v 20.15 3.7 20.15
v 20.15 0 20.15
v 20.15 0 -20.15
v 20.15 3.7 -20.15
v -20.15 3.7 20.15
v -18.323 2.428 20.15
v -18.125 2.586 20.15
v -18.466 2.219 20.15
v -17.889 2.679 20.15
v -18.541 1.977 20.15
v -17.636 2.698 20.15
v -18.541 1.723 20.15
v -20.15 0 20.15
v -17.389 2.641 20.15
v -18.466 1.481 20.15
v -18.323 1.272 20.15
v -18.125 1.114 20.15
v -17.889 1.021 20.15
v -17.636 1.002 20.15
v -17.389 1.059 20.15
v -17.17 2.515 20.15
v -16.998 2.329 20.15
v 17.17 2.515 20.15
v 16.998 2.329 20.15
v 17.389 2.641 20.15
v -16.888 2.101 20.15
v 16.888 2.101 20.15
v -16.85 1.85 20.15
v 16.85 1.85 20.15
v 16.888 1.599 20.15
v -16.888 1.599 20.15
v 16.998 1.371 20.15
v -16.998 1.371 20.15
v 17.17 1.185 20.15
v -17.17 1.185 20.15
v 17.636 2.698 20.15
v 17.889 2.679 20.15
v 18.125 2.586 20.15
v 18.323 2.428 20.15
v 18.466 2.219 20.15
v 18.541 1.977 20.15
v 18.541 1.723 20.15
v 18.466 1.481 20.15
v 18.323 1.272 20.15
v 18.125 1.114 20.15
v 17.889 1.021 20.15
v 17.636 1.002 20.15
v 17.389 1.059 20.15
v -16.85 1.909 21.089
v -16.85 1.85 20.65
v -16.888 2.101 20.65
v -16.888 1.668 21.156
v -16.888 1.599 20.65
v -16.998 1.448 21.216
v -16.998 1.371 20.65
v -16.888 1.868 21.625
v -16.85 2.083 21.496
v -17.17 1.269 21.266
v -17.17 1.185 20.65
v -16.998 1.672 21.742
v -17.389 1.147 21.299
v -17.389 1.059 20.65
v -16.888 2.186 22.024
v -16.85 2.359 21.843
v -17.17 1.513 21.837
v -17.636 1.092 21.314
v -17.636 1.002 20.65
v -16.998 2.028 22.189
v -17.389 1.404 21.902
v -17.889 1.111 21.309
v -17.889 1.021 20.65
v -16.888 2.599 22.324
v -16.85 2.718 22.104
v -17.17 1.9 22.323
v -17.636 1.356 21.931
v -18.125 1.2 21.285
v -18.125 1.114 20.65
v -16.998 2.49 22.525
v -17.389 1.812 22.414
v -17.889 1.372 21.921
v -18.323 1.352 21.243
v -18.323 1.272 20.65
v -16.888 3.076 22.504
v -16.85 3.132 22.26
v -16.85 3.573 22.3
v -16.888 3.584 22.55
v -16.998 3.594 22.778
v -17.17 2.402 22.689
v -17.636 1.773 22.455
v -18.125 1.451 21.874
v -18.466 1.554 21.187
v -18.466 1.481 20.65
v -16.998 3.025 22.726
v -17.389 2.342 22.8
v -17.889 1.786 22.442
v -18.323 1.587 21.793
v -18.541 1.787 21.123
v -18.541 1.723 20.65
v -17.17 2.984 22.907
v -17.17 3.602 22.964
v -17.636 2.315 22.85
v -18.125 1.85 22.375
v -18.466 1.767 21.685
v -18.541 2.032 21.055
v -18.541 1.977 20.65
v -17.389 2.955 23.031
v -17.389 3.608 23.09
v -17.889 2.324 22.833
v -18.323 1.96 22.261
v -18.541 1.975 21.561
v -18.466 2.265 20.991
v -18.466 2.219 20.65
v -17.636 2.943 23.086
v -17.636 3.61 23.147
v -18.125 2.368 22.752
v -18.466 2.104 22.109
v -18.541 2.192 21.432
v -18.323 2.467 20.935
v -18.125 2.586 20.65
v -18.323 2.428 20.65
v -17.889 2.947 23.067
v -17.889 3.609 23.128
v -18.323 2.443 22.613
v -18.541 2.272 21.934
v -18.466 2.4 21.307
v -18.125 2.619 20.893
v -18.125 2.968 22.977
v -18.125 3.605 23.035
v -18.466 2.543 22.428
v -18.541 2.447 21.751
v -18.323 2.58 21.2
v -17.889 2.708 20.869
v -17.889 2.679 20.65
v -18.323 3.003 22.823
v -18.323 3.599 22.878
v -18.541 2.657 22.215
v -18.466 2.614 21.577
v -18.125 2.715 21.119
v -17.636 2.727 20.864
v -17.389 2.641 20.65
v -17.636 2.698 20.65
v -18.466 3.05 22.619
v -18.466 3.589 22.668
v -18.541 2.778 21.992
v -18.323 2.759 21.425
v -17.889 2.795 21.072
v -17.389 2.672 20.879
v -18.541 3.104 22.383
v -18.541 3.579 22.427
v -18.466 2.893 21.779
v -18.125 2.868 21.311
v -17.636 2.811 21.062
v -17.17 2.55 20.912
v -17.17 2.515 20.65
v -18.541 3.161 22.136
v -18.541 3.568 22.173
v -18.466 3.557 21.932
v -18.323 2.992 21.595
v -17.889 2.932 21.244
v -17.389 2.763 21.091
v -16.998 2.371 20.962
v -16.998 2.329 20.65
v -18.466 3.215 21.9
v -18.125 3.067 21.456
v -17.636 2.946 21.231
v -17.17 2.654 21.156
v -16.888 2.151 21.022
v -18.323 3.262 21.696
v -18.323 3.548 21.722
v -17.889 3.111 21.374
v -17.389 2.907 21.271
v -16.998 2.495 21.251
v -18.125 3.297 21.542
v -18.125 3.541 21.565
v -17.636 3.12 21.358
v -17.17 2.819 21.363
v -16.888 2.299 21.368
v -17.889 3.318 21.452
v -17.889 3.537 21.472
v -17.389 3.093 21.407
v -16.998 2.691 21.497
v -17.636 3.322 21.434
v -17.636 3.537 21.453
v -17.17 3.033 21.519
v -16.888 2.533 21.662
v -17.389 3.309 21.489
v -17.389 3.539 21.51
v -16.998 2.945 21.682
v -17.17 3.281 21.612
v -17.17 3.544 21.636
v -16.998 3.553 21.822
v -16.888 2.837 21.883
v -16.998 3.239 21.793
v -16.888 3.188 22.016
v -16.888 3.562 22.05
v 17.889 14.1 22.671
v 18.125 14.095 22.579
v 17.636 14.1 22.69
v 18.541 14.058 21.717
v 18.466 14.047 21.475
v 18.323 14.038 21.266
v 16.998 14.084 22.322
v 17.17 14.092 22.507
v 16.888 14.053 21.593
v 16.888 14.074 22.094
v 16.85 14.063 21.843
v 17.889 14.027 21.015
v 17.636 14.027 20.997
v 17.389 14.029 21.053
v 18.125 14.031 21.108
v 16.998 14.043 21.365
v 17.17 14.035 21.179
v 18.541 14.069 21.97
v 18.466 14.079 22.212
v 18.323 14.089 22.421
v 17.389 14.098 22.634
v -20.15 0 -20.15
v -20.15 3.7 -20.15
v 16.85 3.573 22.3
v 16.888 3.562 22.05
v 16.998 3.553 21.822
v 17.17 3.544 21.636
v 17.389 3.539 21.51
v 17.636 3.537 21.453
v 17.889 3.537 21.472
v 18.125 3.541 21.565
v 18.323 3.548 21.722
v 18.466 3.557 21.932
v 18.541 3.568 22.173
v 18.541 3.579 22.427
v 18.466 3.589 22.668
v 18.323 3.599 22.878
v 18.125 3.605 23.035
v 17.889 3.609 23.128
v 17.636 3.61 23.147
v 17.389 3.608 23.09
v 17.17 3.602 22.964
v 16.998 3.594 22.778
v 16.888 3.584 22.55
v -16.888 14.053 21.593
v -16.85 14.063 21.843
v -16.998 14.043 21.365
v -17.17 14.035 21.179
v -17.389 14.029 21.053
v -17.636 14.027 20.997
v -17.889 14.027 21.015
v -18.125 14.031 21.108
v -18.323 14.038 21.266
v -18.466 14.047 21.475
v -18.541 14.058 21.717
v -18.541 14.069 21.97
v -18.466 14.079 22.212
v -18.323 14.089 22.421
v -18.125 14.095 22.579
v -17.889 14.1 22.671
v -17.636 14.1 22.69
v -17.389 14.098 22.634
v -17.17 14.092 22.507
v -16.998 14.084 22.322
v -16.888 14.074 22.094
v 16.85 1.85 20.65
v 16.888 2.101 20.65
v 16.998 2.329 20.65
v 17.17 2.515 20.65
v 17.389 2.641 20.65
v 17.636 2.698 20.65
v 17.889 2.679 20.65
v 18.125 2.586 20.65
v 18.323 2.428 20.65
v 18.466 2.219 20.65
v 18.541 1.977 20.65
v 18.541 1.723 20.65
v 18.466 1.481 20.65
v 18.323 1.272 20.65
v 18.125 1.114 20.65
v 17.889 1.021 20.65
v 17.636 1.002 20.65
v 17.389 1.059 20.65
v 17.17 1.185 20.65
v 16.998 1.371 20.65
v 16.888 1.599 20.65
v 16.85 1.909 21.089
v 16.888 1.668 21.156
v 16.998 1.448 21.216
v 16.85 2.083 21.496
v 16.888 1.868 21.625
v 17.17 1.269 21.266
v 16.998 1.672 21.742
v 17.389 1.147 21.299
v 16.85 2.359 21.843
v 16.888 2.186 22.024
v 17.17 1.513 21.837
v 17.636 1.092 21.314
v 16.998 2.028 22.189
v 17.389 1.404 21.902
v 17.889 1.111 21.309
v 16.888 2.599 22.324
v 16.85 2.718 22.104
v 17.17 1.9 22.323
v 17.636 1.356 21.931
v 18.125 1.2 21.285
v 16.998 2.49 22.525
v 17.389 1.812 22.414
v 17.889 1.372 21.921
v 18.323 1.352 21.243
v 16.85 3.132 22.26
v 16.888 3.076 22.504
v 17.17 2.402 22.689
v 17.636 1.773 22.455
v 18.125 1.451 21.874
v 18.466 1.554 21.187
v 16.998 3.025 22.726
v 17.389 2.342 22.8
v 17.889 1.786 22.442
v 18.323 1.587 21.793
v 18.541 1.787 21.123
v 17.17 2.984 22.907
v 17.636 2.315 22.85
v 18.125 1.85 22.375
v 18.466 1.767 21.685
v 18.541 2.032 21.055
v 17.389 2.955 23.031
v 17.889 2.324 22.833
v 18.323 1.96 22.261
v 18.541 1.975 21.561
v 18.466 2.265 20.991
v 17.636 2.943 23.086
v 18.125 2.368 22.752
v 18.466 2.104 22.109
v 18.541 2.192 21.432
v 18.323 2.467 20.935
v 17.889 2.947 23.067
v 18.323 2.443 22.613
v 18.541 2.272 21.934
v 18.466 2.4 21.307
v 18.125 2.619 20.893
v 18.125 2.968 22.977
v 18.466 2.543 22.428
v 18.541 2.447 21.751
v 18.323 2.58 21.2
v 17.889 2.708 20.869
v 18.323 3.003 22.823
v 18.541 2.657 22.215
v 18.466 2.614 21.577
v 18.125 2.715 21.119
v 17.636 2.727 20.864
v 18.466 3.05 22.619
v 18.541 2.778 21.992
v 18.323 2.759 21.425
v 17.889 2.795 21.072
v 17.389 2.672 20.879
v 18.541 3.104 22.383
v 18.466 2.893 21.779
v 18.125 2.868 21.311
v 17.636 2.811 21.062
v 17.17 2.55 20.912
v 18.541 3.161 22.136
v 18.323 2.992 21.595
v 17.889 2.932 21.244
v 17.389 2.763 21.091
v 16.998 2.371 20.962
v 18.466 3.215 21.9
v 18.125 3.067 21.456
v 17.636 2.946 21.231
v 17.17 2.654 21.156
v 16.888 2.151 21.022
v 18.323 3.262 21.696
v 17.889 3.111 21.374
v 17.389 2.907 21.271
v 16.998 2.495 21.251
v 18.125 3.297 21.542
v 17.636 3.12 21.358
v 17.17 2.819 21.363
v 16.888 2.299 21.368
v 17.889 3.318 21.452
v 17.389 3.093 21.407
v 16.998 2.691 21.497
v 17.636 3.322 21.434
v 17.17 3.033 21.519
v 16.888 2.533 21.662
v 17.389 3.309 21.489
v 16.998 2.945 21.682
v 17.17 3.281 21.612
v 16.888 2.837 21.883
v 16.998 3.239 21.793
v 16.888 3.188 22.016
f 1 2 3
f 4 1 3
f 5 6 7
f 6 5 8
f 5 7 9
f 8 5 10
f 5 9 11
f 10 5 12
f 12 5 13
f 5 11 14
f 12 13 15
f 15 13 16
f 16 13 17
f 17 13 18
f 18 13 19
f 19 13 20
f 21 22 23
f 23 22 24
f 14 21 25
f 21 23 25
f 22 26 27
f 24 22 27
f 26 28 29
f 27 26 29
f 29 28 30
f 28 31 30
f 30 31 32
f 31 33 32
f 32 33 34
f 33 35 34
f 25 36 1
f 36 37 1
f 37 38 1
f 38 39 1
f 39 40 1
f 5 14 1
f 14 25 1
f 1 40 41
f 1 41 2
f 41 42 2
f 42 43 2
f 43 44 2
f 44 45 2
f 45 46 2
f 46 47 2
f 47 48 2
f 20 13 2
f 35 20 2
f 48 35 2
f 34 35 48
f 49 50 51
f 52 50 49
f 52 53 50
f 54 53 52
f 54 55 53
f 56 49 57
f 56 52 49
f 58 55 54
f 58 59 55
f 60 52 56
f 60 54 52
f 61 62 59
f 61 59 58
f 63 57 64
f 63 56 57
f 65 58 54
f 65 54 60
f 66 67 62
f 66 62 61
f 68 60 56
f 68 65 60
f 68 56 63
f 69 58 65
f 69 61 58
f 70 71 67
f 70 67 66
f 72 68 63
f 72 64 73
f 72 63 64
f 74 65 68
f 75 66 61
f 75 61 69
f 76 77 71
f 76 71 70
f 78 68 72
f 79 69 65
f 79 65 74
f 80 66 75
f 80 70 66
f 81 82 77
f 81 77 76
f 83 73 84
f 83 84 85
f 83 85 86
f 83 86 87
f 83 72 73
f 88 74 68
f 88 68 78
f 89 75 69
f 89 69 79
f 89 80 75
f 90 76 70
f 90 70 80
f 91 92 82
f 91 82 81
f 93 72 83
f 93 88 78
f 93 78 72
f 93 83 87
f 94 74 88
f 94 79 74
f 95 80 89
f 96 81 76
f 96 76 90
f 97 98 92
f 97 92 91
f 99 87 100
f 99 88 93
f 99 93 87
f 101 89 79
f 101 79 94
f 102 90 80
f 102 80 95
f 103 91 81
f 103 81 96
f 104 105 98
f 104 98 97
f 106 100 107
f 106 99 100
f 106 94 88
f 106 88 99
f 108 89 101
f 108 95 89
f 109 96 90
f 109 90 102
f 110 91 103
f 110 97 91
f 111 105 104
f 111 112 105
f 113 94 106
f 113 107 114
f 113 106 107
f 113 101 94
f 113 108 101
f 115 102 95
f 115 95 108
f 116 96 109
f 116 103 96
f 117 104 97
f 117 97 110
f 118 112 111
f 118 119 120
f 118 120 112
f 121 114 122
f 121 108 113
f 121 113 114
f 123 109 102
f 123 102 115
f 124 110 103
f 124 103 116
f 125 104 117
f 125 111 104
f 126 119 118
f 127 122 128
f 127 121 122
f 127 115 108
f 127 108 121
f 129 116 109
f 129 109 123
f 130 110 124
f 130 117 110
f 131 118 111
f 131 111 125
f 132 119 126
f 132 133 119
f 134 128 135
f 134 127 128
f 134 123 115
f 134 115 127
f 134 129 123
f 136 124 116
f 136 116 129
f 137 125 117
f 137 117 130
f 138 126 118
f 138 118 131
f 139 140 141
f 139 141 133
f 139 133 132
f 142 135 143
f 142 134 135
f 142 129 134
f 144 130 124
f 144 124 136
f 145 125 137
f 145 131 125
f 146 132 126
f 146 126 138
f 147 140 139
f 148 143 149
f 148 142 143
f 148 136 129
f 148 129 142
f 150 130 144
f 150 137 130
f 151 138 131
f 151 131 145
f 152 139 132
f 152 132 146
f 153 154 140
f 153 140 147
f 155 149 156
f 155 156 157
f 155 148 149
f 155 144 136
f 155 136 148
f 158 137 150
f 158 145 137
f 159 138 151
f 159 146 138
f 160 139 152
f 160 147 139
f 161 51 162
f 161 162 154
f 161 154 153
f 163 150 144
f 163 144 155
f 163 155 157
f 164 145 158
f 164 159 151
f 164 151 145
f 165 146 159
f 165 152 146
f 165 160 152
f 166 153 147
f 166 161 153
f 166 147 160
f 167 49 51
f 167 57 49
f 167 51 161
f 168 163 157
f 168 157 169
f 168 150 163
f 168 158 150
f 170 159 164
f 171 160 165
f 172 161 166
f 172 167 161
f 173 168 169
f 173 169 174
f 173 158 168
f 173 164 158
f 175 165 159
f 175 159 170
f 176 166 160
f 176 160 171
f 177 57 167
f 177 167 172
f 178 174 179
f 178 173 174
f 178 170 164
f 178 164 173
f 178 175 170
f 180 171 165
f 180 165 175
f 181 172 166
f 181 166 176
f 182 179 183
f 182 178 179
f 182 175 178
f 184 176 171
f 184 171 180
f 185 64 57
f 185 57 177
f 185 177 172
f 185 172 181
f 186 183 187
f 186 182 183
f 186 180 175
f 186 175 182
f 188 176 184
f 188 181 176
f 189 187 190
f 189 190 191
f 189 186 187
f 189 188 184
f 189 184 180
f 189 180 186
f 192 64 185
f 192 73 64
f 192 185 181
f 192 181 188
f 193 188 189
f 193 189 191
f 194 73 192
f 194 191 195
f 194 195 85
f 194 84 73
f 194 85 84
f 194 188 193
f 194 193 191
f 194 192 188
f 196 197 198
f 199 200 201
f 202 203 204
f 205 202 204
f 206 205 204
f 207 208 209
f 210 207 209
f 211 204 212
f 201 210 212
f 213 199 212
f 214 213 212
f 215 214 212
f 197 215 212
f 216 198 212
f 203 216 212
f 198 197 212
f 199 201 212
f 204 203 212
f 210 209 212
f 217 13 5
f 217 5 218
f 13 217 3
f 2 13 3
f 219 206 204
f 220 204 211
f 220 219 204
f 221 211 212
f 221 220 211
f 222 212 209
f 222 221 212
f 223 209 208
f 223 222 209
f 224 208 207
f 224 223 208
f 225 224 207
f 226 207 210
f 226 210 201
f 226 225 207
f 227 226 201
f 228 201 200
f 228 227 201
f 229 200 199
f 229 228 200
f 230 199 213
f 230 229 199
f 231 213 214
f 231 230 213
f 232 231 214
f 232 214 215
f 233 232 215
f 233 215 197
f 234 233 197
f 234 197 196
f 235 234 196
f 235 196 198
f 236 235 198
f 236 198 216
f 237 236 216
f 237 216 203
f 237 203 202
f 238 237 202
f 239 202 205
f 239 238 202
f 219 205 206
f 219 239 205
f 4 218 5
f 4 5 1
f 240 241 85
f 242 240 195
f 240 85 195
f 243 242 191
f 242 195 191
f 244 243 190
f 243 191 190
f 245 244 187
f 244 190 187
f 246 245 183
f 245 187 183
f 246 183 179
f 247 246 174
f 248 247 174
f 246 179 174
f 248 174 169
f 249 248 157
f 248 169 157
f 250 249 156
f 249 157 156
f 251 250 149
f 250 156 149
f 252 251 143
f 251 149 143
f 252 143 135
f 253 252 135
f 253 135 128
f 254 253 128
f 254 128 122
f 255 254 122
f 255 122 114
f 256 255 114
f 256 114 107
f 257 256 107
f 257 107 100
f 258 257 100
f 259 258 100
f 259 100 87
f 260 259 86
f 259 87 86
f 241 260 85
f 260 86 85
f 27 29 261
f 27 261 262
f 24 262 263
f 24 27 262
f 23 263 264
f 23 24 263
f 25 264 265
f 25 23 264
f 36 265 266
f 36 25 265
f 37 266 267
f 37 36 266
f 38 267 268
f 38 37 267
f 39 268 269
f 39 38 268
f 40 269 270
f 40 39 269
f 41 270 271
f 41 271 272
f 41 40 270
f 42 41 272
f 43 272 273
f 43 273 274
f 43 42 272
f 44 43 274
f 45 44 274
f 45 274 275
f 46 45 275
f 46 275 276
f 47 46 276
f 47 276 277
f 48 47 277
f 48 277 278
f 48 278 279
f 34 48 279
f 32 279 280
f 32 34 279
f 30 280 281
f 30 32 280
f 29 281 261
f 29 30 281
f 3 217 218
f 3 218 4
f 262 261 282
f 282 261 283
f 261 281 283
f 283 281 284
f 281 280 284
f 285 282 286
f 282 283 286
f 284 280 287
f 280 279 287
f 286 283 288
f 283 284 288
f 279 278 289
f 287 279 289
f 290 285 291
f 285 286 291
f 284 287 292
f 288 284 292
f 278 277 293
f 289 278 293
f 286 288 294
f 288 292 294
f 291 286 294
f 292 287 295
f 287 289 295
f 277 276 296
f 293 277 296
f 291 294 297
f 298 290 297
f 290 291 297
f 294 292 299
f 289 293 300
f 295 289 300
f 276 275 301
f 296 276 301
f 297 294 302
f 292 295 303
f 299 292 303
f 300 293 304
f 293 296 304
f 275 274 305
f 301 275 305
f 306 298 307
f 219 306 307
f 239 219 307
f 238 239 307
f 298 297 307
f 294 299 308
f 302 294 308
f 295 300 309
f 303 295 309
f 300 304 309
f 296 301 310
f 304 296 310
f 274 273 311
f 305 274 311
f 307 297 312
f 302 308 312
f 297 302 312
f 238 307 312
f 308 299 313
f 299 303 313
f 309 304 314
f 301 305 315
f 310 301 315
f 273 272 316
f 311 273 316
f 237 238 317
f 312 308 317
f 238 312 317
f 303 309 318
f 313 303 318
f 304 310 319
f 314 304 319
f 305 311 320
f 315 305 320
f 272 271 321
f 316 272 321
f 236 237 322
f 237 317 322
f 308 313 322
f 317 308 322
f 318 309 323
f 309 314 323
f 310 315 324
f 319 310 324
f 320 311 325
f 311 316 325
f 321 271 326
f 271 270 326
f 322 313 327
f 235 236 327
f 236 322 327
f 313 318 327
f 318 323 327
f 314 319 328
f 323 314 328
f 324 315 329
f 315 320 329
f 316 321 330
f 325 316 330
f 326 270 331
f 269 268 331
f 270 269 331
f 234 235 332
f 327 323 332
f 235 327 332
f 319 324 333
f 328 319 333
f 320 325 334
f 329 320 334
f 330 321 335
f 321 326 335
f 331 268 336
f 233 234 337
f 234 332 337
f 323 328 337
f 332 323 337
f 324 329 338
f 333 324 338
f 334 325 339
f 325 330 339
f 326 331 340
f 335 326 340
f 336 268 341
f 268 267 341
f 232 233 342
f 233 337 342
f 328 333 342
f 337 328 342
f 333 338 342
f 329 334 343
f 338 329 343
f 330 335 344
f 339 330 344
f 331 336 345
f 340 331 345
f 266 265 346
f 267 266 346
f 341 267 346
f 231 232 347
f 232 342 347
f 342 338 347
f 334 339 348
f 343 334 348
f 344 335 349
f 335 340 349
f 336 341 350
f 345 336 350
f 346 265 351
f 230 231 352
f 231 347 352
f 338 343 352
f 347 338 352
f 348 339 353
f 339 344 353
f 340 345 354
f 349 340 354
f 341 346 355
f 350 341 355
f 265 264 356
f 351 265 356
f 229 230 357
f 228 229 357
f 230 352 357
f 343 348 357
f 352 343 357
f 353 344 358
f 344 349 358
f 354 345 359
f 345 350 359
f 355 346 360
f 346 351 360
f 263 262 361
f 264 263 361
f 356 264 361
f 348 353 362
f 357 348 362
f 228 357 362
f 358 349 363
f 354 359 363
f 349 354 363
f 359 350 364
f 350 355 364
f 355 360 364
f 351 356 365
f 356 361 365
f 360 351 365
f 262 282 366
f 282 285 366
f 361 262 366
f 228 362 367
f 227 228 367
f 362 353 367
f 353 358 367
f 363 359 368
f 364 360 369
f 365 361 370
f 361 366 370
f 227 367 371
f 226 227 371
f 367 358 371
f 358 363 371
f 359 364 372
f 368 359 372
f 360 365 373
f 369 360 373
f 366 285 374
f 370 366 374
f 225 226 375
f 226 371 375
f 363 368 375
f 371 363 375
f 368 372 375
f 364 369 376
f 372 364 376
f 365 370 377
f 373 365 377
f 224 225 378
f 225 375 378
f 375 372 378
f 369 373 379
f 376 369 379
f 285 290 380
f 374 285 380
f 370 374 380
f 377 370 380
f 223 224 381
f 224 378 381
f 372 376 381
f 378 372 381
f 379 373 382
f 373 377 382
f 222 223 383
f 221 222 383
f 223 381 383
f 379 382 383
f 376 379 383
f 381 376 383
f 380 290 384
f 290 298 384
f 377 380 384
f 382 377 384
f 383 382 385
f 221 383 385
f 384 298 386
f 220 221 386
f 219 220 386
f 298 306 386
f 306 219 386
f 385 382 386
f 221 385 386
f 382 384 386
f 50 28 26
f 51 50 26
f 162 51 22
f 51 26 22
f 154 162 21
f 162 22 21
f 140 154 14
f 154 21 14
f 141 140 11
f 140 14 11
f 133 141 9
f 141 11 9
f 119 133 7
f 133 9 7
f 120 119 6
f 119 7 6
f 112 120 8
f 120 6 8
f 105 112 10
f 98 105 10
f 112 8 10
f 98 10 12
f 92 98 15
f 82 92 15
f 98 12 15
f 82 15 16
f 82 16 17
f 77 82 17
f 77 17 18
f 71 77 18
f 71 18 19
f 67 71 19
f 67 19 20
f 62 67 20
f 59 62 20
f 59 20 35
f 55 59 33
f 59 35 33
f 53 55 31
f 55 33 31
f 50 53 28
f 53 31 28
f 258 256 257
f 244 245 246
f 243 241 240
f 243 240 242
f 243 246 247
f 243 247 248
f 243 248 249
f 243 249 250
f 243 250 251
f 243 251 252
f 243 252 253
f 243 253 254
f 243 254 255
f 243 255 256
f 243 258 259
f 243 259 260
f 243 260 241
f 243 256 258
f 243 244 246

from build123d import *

# Parameters (mm, degrees)
SKETCH1_W           = 40.3
SKETCH1_H           = 40.3
BOSS_EXTRUDE1_DEPTH = 3.7
SKETCH3_R           = 0.85
BOSS_EXTRUDE2_DEPTH = 0.5
SKETCH5_R           = 0.85
SKETCH6_R           = 0.85
BOSS_EXTRUDE3_DEPTH = 10.5


with BuildPart() as part:
    # Sketch1 → Boss-Extrude1 (new body)
    with BuildSketch(Plane(origin=(0, 0, 0), x_dir=(1, 0, 0), z_dir=(0, 1, 0))):
        Rectangle(SKETCH1_W, SKETCH1_H)
    extrude(amount=BOSS_EXTRUDE1_DEPTH)

    # Sketch3 → Boss-Extrude2 (add)
    with BuildSketch(Plane.XY.offset(20.15)):
        with Locations((-17.7, 1.85)):
            Circle(SKETCH3_R)
    boss_extrude2 = extrude(amount=BOSS_EXTRUDE2_DEPTH)

    # Sweep1: sweep along a path in Sketch4
    with BuildLine(Plane.ZY.offset(17.7)) as sweep1_path:
        ThreePointArc((20.65, 1.85), (21.842957341, 2.359410226), (22.3, 3.573394576))
    # Sketch5 → Sweep1 (sweep)
    with BuildSketch(Plane.XY.offset(20.65)):
        with Locations((-17.7, 1.85)):
            Circle(SKETCH5_R)
    sweep1 = sweep(path=sweep1_path.line)

    # Sketch6 → Boss-Extrude3 (add)
    with BuildSketch(Plane(origin=(0, 2.597654528, -0.113087301), x_dir=(1, 0, 0), z_dir=(0, 0.9990537233687481, -0.04349319283567326))):
        with Locations((-17.7, -22.434316371)):
            Circle(SKETCH6_R)
    boss_extrude3 = extrude(amount=BOSS_EXTRUDE3_DEPTH)

    # Mirror1: Boss-Extrude2, Sweep1, Boss-Extrude3 across plane
    add(boss_extrude2.mirror(Plane(origin=(0, 0, 0), x_dir=(0, 0, 1), z_dir=(1, 0, 0))))
    add(sweep1.mirror(Plane(origin=(0, 0, 0), x_dir=(0, 0, 1), z_dir=(1, 0, 0))))
    add(boss_extrude3.mirror(Plane(origin=(0, 0, 0), x_dir=(0, 0, 1), z_dir=(1, 0, 0))))


solid = part.part
